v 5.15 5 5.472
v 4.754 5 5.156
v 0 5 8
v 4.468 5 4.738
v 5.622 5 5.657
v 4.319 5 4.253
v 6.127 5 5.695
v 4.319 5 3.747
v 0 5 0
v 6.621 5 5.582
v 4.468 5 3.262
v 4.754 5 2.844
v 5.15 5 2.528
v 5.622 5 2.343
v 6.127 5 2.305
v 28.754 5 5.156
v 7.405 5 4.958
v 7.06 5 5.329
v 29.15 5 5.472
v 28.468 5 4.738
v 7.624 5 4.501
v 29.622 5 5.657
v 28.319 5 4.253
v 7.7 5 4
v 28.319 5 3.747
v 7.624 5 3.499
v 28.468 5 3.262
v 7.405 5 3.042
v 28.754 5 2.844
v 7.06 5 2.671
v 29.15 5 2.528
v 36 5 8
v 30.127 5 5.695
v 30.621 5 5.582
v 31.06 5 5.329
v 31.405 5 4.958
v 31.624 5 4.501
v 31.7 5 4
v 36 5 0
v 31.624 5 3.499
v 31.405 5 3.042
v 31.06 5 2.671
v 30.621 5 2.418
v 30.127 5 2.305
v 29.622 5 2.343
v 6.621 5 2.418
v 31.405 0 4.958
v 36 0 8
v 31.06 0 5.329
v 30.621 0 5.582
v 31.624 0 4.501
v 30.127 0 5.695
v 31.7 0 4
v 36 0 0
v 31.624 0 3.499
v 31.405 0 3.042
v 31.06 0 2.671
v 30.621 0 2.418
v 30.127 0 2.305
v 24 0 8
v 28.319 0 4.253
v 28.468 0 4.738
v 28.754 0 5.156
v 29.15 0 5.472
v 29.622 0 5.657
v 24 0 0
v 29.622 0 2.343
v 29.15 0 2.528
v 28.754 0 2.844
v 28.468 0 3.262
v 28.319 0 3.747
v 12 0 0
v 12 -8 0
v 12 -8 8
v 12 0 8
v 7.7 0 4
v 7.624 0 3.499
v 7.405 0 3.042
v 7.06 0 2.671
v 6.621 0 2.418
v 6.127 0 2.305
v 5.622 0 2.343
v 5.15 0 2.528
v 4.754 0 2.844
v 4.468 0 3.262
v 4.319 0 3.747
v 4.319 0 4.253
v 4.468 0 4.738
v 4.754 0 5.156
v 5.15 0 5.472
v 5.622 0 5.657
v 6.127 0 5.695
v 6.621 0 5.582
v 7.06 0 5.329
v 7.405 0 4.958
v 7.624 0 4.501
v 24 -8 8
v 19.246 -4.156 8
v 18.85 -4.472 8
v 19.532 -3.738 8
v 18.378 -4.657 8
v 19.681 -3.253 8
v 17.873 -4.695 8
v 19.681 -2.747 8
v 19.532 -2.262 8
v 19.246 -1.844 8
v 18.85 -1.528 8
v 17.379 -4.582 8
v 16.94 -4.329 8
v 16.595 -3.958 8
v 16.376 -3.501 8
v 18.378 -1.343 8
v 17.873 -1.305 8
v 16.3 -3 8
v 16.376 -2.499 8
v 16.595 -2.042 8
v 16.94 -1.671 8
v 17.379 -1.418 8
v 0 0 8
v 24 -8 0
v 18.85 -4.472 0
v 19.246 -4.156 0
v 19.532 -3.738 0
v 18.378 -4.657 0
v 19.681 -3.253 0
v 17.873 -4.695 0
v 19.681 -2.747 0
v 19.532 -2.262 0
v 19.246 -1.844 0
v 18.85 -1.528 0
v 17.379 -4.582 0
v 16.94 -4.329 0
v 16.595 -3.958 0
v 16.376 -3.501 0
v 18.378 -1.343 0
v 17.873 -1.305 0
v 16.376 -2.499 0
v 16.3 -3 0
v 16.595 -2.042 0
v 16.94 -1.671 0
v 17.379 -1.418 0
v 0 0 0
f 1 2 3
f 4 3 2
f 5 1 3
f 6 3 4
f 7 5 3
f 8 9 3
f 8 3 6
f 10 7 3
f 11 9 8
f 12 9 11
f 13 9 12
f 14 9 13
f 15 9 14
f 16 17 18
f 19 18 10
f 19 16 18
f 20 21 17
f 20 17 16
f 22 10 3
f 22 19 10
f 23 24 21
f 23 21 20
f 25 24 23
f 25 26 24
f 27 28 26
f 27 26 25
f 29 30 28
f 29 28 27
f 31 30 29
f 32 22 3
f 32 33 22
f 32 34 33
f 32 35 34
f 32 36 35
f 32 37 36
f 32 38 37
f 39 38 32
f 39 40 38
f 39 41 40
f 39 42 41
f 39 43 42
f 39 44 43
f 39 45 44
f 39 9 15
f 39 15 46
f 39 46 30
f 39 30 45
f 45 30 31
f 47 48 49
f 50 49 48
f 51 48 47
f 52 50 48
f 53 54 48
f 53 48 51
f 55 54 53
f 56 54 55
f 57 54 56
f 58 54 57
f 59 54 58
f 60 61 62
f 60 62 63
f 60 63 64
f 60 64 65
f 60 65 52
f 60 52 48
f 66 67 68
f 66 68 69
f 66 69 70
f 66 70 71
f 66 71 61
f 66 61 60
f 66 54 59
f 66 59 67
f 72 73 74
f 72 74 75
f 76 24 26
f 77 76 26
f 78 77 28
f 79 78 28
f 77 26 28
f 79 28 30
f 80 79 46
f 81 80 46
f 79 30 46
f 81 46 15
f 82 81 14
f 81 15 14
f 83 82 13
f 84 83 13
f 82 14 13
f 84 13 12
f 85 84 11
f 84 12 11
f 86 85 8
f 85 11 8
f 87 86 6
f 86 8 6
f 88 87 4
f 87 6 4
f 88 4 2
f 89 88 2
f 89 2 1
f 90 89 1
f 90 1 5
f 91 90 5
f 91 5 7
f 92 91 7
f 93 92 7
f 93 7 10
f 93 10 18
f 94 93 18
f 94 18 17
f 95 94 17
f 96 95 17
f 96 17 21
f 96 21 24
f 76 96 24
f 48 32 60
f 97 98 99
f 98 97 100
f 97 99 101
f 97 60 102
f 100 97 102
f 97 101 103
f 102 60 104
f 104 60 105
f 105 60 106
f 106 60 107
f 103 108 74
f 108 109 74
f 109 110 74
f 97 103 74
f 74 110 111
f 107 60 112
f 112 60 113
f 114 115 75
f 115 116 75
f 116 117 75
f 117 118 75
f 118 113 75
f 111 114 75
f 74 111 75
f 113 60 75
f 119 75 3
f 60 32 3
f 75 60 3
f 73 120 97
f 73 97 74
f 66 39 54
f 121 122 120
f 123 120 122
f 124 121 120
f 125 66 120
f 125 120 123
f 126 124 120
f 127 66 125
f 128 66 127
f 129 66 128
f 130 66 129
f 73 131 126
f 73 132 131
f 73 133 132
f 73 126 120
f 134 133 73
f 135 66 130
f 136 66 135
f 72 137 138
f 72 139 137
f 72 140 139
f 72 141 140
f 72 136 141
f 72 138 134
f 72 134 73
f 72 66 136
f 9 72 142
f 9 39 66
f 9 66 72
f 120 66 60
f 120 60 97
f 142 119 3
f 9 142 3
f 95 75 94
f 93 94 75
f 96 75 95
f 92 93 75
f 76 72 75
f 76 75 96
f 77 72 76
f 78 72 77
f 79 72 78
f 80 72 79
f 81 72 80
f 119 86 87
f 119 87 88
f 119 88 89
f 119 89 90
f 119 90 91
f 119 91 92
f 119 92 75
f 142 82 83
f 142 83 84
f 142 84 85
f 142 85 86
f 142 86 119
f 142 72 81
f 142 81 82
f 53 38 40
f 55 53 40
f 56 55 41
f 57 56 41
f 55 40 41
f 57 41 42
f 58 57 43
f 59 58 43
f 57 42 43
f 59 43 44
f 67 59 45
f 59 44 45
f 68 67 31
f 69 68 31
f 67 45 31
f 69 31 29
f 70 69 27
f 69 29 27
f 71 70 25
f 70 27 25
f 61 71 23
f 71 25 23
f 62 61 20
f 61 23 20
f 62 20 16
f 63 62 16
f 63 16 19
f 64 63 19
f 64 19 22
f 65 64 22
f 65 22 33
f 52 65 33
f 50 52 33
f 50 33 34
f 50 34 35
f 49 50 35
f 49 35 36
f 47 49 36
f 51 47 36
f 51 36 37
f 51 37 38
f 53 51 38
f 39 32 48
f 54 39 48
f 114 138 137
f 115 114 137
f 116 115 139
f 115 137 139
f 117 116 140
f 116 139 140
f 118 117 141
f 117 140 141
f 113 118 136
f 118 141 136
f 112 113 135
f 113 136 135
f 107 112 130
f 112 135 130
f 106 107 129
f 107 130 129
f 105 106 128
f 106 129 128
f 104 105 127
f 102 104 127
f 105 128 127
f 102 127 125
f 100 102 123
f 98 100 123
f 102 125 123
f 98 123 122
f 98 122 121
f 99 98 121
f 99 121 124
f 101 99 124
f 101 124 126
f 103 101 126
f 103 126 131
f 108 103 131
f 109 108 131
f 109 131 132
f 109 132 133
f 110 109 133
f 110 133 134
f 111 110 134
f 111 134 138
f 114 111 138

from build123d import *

# Parameters (mm, degrees)
BOSS_EXTRUDE1_DEPTH  = 8
M3_CLEARANCE_HOLE1_D = 3.4
M3_CLEARANCE_HOLE2_D = 3.4


with BuildPart() as part:
    # Sketch1 → Boss-Extrude1 (new body)
    with BuildSketch(Plane.XY):
        Polygon((0, 0), (0, 5), (36, 5), (36, 0), (24, 0), (24, -8), (12, -8), (12, 0), align=None)
    extrude(amount=BOSS_EXTRUDE1_DEPTH)

    # M3 Clearance Hole1 (through all)
    with Locations(Plane.XY.offset(8)):
        with Locations((18, -3)):
            Hole(M3_CLEARANCE_HOLE1_D / 2)

    # M3 Clearance Hole2 (through all)
    with Locations(Plane(origin=(0, 0, 0), x_dir=(-1, 0, 0), z_dir=(0, -1, 0))):
        with Locations((-6, -4), (-30, -4)):
            Hole(M3_CLEARANCE_HOLE2_D / 2)


solid = part.part
